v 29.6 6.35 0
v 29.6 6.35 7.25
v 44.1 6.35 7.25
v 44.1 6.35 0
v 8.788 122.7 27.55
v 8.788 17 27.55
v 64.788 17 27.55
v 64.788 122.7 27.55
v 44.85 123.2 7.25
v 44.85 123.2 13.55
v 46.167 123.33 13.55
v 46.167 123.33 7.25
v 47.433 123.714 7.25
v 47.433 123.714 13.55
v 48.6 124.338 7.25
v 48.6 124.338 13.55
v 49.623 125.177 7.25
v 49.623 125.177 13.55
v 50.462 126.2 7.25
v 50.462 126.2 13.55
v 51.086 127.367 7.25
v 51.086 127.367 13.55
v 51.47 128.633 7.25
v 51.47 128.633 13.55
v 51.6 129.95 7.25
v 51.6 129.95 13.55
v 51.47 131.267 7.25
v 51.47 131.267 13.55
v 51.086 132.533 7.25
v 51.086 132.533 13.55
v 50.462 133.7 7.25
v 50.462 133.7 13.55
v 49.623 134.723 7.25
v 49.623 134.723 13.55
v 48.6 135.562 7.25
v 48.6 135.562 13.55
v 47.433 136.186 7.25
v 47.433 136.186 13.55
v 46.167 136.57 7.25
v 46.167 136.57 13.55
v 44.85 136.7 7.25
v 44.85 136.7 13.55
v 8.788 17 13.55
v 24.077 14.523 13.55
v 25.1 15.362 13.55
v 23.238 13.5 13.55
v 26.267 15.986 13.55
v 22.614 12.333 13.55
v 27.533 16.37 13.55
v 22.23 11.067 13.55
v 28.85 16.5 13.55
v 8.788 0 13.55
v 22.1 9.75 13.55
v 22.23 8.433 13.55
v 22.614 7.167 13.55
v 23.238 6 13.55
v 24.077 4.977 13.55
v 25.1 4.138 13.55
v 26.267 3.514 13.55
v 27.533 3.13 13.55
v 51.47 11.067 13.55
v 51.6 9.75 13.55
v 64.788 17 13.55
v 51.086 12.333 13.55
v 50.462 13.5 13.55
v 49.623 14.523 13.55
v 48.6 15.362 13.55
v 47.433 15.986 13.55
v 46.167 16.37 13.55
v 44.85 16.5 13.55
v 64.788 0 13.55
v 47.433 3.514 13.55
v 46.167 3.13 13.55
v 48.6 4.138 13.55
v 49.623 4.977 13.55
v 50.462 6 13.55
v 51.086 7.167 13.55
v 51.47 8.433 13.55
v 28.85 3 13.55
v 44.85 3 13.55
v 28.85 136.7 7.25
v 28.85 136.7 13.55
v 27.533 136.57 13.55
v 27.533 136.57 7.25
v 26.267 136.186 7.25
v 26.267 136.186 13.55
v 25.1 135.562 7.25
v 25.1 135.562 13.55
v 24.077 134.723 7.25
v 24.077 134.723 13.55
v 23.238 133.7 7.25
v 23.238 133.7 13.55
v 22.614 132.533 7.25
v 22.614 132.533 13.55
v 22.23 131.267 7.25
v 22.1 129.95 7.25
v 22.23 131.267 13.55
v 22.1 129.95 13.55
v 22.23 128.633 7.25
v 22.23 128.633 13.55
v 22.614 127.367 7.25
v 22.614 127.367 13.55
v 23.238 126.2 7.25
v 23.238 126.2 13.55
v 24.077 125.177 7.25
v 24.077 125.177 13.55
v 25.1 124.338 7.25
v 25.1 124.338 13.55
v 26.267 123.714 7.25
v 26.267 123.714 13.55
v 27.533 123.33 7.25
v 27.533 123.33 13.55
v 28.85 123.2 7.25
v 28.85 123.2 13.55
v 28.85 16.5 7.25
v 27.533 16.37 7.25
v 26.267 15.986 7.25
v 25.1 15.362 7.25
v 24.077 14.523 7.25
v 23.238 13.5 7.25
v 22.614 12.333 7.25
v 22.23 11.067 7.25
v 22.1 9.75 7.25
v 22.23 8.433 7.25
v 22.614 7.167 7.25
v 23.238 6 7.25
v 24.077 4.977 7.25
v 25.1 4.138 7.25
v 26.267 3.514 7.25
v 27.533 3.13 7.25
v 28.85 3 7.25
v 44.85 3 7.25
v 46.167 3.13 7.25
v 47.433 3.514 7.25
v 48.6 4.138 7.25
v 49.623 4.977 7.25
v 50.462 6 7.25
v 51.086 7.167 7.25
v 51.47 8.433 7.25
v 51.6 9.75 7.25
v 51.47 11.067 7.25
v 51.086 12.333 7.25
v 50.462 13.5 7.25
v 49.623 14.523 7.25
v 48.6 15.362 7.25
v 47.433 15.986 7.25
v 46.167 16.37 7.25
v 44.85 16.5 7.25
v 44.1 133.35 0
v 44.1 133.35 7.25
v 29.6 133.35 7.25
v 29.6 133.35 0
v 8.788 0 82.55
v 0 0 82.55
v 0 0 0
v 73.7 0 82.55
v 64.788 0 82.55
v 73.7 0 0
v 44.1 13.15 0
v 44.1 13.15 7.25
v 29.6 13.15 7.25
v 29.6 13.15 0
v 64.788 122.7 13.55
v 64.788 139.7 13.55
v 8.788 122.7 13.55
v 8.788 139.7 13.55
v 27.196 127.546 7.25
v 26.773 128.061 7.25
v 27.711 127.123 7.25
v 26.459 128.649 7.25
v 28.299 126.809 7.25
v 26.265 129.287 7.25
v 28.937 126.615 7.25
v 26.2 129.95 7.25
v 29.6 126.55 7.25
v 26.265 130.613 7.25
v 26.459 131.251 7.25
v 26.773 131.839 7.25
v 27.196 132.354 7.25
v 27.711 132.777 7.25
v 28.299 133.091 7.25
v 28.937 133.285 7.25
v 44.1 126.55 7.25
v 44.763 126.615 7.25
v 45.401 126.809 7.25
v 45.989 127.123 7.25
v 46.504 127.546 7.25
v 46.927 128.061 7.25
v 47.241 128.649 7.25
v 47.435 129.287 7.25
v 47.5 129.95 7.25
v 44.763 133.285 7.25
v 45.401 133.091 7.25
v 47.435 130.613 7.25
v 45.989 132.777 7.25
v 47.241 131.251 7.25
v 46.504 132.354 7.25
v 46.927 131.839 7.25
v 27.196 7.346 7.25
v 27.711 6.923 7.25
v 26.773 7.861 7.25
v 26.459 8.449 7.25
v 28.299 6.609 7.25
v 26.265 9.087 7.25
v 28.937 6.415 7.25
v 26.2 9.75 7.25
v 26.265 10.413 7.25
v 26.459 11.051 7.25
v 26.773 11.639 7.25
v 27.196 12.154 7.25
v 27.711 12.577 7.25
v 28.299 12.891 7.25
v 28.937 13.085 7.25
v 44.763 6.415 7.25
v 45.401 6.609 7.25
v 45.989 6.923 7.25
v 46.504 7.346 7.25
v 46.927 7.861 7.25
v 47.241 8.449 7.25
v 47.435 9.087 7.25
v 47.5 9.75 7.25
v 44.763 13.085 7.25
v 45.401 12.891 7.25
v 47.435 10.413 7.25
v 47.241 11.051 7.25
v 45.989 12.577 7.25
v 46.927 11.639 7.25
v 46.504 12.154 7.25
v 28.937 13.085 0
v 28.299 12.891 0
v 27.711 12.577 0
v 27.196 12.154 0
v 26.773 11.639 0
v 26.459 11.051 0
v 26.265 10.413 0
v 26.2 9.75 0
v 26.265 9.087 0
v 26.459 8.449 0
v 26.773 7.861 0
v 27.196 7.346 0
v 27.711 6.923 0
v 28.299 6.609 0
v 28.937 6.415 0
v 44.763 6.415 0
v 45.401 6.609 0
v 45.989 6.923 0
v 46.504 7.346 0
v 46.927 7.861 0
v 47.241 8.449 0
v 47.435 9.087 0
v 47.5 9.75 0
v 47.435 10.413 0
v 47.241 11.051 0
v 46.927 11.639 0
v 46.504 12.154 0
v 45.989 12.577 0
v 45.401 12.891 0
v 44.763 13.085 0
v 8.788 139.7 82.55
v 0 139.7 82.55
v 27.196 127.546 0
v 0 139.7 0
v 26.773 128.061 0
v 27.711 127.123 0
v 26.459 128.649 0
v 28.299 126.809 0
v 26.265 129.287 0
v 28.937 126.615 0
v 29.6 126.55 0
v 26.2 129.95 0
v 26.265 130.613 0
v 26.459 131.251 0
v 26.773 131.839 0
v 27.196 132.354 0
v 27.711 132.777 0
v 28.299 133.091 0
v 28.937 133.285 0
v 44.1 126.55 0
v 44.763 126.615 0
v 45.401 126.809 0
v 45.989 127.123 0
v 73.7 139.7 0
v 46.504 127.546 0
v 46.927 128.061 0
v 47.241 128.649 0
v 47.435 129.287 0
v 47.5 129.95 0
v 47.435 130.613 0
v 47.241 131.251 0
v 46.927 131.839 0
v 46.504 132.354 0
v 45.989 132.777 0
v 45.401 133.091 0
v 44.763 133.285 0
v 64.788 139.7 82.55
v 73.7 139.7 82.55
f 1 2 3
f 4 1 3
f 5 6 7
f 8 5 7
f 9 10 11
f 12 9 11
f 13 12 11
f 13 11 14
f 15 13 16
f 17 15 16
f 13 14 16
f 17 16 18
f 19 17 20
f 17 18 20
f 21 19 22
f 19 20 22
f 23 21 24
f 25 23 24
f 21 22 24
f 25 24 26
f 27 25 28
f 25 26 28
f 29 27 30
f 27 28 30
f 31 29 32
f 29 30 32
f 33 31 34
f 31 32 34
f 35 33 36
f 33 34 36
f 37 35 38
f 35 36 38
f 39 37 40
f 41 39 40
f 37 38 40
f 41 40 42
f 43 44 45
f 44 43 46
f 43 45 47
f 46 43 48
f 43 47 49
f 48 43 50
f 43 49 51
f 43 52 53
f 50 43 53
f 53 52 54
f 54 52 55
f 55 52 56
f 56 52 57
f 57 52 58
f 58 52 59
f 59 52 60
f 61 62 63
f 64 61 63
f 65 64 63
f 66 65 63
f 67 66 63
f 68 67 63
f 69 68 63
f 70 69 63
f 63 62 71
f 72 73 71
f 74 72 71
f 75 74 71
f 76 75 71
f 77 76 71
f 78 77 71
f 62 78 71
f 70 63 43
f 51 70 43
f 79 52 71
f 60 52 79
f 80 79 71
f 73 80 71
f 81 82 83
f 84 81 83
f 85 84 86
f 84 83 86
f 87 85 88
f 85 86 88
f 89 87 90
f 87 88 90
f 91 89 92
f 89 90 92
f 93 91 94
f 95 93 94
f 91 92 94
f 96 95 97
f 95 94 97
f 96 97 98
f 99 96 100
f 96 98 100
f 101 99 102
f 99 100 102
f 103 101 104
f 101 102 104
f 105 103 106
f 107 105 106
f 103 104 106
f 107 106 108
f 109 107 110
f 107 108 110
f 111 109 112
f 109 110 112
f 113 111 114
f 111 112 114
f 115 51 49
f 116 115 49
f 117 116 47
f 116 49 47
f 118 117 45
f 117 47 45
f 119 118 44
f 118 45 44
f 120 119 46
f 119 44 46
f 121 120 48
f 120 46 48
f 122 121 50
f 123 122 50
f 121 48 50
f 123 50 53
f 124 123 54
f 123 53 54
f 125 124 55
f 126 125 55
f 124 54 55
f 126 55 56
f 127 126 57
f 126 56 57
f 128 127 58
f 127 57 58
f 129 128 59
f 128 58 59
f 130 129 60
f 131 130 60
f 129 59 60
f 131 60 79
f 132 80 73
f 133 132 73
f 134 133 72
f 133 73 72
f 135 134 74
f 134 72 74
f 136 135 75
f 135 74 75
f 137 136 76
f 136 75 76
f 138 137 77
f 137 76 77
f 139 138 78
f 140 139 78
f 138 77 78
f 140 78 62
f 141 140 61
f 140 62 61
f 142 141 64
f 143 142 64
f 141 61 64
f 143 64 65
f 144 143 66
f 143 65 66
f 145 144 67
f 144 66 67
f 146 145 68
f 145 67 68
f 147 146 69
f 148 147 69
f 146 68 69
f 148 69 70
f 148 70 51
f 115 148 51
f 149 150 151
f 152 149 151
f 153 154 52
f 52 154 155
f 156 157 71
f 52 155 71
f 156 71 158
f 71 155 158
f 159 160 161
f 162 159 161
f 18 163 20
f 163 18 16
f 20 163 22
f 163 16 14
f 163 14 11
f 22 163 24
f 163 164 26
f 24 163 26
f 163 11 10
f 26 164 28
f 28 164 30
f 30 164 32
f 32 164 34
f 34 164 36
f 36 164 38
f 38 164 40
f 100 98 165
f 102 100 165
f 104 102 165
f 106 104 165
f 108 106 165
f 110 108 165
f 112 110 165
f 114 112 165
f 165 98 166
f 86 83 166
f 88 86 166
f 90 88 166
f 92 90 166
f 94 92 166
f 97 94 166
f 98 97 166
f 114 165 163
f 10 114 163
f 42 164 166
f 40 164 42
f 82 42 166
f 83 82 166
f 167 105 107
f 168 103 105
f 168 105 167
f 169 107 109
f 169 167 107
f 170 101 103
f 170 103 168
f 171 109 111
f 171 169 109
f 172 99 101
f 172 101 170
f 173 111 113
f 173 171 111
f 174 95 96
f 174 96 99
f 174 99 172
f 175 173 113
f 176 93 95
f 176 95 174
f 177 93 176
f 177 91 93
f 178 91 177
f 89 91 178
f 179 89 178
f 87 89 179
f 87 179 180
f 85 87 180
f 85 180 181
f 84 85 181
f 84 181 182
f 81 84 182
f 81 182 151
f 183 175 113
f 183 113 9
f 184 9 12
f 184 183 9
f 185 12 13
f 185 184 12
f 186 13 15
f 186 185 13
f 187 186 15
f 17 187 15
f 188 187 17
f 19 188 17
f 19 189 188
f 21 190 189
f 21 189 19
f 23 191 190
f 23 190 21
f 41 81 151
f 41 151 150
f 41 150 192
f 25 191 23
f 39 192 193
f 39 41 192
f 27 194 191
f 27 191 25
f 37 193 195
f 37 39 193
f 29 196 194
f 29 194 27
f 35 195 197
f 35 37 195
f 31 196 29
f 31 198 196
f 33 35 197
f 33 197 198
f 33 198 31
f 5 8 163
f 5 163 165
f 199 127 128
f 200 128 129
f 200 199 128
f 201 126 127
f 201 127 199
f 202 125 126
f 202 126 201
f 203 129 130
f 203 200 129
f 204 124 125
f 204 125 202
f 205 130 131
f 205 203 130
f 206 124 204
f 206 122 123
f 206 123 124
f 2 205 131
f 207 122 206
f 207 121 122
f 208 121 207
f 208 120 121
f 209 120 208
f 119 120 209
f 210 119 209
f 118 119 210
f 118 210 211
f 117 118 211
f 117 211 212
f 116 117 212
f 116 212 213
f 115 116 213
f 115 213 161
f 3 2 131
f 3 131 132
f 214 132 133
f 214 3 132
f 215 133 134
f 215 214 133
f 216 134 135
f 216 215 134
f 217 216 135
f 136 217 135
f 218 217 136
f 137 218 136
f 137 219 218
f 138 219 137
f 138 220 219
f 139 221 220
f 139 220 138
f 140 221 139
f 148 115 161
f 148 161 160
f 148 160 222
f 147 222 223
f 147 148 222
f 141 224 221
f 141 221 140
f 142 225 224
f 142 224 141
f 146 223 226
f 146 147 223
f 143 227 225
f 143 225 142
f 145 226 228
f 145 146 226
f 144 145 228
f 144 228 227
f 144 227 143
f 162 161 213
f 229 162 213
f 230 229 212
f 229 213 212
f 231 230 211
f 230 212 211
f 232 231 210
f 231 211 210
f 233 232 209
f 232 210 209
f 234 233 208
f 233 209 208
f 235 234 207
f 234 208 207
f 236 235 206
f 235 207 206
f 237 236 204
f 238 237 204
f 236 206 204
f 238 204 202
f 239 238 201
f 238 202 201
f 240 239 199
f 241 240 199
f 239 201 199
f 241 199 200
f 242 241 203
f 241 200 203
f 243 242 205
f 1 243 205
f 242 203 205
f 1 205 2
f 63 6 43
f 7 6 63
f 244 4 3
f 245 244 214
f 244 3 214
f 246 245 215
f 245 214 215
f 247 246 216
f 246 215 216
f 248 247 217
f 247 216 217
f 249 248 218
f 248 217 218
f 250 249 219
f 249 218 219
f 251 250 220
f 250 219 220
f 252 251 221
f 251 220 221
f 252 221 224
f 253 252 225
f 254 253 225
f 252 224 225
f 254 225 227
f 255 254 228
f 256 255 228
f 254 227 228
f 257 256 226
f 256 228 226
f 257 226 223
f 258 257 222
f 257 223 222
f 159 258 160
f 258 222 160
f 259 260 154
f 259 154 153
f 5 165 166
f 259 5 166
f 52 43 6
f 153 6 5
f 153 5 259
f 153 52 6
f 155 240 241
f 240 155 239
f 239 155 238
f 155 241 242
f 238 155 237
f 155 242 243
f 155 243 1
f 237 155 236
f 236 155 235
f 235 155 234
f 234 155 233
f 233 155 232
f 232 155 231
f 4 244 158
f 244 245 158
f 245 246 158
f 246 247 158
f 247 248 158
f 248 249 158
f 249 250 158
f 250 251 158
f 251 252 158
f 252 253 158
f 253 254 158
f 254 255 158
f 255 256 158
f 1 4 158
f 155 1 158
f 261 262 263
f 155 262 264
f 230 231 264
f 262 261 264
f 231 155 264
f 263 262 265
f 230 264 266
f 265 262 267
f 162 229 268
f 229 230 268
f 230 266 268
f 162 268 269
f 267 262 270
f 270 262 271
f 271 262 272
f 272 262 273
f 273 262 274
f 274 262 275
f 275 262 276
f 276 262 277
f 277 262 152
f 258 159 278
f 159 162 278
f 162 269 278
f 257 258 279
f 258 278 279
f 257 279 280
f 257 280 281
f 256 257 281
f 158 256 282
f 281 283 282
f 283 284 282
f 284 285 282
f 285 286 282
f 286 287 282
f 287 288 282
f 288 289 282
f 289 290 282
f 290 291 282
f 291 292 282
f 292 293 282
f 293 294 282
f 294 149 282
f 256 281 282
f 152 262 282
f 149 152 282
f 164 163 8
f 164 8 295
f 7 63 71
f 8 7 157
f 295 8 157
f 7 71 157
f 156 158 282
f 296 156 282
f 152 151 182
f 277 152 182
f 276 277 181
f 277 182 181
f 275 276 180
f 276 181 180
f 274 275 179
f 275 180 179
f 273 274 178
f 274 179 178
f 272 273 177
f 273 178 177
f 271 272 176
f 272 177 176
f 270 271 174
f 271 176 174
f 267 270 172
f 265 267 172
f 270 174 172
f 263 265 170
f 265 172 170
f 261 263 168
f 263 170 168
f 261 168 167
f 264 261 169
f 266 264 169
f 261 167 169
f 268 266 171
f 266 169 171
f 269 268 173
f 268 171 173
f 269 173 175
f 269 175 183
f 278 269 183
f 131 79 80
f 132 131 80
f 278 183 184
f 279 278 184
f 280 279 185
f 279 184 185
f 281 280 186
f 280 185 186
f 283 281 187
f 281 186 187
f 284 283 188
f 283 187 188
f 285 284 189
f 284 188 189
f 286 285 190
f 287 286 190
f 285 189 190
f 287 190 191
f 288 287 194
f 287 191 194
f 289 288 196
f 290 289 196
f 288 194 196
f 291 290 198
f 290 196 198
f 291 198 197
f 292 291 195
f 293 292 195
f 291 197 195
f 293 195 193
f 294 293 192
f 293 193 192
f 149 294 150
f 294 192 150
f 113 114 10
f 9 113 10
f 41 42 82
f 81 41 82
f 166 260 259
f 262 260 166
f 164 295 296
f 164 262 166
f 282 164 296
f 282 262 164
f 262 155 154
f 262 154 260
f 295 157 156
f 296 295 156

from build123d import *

# Parameters (mm, degrees)
F0_W      = 73.7
F0_H      = 139.7
F1_DEPTH  = 82.55
F2_W      = 56
F2_H      = 55
F3_DEPTH  = 139.701
F4_W      = 56
F4_H      = 14
F5_DEPTH  = 17
F6_W      = 56
F6_H      = 14
F7_DEPTH  = 17
F9_DEPTH  = 6.3
F10_DEPTH = 13.551


with BuildPart() as f1:
    # F0 (on Top) → F1 (new body)
    with BuildSketch(Plane.XY):
        with Locations((36.85, 69.85)):
            Rectangle(F0_W, F0_H)
    extrude(amount=F1_DEPTH)

    # F2 (on face) → F3 (cut, through all)
    with BuildSketch(Plane.XZ):
        with Locations((36.787815, 55.05)):
            Rectangle(F2_W, F2_H)
    extrude(amount=-F3_DEPTH, mode=Mode.SUBTRACT)

    # F4 (on face) → F5 (cut)
    with BuildSketch(Plane.XZ):
        with Locations((36.787815, 20.55)):
            Rectangle(F4_W, F4_H)
    extrude(amount=-F5_DEPTH, mode=Mode.SUBTRACT)

    # F6 (on face) → F7 (cut)
    with BuildSketch(Plane(origin=(0, 139.7, 0), x_dir=(-1, 0, 0), z_dir=(0, 1, 0))):
        with Locations((-36.787815, 20.55)):
            Rectangle(F6_W, F6_H)
    extrude(amount=-F7_DEPTH, mode=Mode.SUBTRACT)

    # F8 (on face) → F9 (cut)
    with BuildSketch(Plane.XY.offset(13.55)):
        with BuildLine():
            Line((44.85, 136.7), (28.85, 136.7))
            ThreePointArc((28.85, 136.7), (22.1, 129.95), (28.85, 123.2))
            Line((28.85, 123.2), (44.85, 123.2))
            ThreePointArc((44.85, 123.2), (51.6, 129.95), (44.85, 136.7))
        make_face()
        with BuildLine():
            ThreePointArc((29.6, 126.55), (26.2, 129.95), (29.6, 133.35))
            Line((29.6, 133.35), (44.1, 133.35))
            ThreePointArc((44.1, 133.35), (47.5, 129.95), (44.1, 126.55))
            Line((44.1, 126.55), (29.6, 126.55))
        make_face(mode=Mode.SUBTRACT)
        with BuildLine():
            ThreePointArc((44.85, 3), (51.6, 9.75), (44.85, 16.5))
            Line((44.85, 16.5), (28.85, 16.5))
            ThreePointArc((28.85, 16.5), (22.1, 9.75), (28.85, 3))
            Line((28.85, 3), (44.85, 3))
        make_face()
        with BuildLine():
            Line((29.6, 13.15), (44.1, 13.15))
            ThreePointArc((44.1, 13.15), (47.5, 9.75), (44.1, 6.35))
            Line((44.1, 6.35), (29.6, 6.35))
            ThreePointArc((29.6, 6.35), (26.2, 9.75), (29.6, 13.15))
        make_face(mode=Mode.SUBTRACT)
    extrude(amount=-F9_DEPTH, mode=Mode.SUBTRACT)

    # F9_face (on face) → F10 (cut, through all)
    with BuildSketch(Plane(origin=(36.85, 129.95, 13.55), x_dir=(1, 0, 0), z_dir=(0, 0, 1))):
        with BuildLine():
            Line((-7.25, -3.4), (7.25, -3.4))
            ThreePointArc((7.25, -3.4), (10.65, 0), (7.25, 3.4))
            Line((7.25, 3.4), (-7.25, 3.4))
            ThreePointArc((-7.25, 3.4), (-10.65, 0), (-7.25, -3.4))
        make_face()
        with BuildLine():
            ThreePointArc((7.25, -123.6), (10.65, -120.2), (7.25, -116.8))
            Line((7.25, -116.8), (-7.25, -116.8))
            ThreePointArc((-7.25, -116.8), (-10.65, -120.2), (-7.25, -123.6))
            Line((-7.25, -123.6), (7.25, -123.6))
        make_face()
    extrude(amount=-F10_DEPTH, mode=Mode.SUBTRACT)


solid = f1.part
